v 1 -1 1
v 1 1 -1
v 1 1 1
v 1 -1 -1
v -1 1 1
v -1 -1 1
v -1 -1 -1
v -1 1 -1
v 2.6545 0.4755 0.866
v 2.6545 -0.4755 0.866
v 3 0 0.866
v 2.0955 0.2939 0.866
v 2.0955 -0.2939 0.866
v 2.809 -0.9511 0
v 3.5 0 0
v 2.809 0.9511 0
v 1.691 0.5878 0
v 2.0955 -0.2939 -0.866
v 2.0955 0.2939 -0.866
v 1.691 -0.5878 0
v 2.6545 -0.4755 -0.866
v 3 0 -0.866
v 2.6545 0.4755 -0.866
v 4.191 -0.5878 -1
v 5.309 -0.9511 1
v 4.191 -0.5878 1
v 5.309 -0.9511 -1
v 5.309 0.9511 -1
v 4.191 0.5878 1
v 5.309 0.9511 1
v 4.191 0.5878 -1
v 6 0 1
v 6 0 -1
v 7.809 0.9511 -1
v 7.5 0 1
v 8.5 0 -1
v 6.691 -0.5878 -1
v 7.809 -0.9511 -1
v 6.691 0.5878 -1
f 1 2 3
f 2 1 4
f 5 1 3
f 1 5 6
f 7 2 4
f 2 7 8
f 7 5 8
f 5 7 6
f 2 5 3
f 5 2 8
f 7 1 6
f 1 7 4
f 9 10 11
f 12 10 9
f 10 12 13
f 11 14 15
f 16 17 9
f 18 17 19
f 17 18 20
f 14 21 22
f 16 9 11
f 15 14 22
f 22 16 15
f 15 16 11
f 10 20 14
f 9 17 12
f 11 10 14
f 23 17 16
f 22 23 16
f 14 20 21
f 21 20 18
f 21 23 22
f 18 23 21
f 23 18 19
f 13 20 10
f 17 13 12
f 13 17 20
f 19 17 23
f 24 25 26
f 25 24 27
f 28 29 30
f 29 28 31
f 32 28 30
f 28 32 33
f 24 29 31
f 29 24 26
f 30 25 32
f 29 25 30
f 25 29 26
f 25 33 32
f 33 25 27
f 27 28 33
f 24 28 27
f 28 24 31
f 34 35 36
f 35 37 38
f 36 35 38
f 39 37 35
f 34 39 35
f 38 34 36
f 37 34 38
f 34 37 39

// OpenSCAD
spacing = 2.5;

module primitives (spacing){
color("red")
translate([0,0,0])
cube(2, center=true);

color("green")
translate([spacing,0,0])
sphere(1);
translate([spacing*2,0,0])

color("blue")
cylinder(2,1,1,center=true);

translate([spacing*3,0,0])
cylinder(2,1,0, center=true);
}

primitives(spacing);
